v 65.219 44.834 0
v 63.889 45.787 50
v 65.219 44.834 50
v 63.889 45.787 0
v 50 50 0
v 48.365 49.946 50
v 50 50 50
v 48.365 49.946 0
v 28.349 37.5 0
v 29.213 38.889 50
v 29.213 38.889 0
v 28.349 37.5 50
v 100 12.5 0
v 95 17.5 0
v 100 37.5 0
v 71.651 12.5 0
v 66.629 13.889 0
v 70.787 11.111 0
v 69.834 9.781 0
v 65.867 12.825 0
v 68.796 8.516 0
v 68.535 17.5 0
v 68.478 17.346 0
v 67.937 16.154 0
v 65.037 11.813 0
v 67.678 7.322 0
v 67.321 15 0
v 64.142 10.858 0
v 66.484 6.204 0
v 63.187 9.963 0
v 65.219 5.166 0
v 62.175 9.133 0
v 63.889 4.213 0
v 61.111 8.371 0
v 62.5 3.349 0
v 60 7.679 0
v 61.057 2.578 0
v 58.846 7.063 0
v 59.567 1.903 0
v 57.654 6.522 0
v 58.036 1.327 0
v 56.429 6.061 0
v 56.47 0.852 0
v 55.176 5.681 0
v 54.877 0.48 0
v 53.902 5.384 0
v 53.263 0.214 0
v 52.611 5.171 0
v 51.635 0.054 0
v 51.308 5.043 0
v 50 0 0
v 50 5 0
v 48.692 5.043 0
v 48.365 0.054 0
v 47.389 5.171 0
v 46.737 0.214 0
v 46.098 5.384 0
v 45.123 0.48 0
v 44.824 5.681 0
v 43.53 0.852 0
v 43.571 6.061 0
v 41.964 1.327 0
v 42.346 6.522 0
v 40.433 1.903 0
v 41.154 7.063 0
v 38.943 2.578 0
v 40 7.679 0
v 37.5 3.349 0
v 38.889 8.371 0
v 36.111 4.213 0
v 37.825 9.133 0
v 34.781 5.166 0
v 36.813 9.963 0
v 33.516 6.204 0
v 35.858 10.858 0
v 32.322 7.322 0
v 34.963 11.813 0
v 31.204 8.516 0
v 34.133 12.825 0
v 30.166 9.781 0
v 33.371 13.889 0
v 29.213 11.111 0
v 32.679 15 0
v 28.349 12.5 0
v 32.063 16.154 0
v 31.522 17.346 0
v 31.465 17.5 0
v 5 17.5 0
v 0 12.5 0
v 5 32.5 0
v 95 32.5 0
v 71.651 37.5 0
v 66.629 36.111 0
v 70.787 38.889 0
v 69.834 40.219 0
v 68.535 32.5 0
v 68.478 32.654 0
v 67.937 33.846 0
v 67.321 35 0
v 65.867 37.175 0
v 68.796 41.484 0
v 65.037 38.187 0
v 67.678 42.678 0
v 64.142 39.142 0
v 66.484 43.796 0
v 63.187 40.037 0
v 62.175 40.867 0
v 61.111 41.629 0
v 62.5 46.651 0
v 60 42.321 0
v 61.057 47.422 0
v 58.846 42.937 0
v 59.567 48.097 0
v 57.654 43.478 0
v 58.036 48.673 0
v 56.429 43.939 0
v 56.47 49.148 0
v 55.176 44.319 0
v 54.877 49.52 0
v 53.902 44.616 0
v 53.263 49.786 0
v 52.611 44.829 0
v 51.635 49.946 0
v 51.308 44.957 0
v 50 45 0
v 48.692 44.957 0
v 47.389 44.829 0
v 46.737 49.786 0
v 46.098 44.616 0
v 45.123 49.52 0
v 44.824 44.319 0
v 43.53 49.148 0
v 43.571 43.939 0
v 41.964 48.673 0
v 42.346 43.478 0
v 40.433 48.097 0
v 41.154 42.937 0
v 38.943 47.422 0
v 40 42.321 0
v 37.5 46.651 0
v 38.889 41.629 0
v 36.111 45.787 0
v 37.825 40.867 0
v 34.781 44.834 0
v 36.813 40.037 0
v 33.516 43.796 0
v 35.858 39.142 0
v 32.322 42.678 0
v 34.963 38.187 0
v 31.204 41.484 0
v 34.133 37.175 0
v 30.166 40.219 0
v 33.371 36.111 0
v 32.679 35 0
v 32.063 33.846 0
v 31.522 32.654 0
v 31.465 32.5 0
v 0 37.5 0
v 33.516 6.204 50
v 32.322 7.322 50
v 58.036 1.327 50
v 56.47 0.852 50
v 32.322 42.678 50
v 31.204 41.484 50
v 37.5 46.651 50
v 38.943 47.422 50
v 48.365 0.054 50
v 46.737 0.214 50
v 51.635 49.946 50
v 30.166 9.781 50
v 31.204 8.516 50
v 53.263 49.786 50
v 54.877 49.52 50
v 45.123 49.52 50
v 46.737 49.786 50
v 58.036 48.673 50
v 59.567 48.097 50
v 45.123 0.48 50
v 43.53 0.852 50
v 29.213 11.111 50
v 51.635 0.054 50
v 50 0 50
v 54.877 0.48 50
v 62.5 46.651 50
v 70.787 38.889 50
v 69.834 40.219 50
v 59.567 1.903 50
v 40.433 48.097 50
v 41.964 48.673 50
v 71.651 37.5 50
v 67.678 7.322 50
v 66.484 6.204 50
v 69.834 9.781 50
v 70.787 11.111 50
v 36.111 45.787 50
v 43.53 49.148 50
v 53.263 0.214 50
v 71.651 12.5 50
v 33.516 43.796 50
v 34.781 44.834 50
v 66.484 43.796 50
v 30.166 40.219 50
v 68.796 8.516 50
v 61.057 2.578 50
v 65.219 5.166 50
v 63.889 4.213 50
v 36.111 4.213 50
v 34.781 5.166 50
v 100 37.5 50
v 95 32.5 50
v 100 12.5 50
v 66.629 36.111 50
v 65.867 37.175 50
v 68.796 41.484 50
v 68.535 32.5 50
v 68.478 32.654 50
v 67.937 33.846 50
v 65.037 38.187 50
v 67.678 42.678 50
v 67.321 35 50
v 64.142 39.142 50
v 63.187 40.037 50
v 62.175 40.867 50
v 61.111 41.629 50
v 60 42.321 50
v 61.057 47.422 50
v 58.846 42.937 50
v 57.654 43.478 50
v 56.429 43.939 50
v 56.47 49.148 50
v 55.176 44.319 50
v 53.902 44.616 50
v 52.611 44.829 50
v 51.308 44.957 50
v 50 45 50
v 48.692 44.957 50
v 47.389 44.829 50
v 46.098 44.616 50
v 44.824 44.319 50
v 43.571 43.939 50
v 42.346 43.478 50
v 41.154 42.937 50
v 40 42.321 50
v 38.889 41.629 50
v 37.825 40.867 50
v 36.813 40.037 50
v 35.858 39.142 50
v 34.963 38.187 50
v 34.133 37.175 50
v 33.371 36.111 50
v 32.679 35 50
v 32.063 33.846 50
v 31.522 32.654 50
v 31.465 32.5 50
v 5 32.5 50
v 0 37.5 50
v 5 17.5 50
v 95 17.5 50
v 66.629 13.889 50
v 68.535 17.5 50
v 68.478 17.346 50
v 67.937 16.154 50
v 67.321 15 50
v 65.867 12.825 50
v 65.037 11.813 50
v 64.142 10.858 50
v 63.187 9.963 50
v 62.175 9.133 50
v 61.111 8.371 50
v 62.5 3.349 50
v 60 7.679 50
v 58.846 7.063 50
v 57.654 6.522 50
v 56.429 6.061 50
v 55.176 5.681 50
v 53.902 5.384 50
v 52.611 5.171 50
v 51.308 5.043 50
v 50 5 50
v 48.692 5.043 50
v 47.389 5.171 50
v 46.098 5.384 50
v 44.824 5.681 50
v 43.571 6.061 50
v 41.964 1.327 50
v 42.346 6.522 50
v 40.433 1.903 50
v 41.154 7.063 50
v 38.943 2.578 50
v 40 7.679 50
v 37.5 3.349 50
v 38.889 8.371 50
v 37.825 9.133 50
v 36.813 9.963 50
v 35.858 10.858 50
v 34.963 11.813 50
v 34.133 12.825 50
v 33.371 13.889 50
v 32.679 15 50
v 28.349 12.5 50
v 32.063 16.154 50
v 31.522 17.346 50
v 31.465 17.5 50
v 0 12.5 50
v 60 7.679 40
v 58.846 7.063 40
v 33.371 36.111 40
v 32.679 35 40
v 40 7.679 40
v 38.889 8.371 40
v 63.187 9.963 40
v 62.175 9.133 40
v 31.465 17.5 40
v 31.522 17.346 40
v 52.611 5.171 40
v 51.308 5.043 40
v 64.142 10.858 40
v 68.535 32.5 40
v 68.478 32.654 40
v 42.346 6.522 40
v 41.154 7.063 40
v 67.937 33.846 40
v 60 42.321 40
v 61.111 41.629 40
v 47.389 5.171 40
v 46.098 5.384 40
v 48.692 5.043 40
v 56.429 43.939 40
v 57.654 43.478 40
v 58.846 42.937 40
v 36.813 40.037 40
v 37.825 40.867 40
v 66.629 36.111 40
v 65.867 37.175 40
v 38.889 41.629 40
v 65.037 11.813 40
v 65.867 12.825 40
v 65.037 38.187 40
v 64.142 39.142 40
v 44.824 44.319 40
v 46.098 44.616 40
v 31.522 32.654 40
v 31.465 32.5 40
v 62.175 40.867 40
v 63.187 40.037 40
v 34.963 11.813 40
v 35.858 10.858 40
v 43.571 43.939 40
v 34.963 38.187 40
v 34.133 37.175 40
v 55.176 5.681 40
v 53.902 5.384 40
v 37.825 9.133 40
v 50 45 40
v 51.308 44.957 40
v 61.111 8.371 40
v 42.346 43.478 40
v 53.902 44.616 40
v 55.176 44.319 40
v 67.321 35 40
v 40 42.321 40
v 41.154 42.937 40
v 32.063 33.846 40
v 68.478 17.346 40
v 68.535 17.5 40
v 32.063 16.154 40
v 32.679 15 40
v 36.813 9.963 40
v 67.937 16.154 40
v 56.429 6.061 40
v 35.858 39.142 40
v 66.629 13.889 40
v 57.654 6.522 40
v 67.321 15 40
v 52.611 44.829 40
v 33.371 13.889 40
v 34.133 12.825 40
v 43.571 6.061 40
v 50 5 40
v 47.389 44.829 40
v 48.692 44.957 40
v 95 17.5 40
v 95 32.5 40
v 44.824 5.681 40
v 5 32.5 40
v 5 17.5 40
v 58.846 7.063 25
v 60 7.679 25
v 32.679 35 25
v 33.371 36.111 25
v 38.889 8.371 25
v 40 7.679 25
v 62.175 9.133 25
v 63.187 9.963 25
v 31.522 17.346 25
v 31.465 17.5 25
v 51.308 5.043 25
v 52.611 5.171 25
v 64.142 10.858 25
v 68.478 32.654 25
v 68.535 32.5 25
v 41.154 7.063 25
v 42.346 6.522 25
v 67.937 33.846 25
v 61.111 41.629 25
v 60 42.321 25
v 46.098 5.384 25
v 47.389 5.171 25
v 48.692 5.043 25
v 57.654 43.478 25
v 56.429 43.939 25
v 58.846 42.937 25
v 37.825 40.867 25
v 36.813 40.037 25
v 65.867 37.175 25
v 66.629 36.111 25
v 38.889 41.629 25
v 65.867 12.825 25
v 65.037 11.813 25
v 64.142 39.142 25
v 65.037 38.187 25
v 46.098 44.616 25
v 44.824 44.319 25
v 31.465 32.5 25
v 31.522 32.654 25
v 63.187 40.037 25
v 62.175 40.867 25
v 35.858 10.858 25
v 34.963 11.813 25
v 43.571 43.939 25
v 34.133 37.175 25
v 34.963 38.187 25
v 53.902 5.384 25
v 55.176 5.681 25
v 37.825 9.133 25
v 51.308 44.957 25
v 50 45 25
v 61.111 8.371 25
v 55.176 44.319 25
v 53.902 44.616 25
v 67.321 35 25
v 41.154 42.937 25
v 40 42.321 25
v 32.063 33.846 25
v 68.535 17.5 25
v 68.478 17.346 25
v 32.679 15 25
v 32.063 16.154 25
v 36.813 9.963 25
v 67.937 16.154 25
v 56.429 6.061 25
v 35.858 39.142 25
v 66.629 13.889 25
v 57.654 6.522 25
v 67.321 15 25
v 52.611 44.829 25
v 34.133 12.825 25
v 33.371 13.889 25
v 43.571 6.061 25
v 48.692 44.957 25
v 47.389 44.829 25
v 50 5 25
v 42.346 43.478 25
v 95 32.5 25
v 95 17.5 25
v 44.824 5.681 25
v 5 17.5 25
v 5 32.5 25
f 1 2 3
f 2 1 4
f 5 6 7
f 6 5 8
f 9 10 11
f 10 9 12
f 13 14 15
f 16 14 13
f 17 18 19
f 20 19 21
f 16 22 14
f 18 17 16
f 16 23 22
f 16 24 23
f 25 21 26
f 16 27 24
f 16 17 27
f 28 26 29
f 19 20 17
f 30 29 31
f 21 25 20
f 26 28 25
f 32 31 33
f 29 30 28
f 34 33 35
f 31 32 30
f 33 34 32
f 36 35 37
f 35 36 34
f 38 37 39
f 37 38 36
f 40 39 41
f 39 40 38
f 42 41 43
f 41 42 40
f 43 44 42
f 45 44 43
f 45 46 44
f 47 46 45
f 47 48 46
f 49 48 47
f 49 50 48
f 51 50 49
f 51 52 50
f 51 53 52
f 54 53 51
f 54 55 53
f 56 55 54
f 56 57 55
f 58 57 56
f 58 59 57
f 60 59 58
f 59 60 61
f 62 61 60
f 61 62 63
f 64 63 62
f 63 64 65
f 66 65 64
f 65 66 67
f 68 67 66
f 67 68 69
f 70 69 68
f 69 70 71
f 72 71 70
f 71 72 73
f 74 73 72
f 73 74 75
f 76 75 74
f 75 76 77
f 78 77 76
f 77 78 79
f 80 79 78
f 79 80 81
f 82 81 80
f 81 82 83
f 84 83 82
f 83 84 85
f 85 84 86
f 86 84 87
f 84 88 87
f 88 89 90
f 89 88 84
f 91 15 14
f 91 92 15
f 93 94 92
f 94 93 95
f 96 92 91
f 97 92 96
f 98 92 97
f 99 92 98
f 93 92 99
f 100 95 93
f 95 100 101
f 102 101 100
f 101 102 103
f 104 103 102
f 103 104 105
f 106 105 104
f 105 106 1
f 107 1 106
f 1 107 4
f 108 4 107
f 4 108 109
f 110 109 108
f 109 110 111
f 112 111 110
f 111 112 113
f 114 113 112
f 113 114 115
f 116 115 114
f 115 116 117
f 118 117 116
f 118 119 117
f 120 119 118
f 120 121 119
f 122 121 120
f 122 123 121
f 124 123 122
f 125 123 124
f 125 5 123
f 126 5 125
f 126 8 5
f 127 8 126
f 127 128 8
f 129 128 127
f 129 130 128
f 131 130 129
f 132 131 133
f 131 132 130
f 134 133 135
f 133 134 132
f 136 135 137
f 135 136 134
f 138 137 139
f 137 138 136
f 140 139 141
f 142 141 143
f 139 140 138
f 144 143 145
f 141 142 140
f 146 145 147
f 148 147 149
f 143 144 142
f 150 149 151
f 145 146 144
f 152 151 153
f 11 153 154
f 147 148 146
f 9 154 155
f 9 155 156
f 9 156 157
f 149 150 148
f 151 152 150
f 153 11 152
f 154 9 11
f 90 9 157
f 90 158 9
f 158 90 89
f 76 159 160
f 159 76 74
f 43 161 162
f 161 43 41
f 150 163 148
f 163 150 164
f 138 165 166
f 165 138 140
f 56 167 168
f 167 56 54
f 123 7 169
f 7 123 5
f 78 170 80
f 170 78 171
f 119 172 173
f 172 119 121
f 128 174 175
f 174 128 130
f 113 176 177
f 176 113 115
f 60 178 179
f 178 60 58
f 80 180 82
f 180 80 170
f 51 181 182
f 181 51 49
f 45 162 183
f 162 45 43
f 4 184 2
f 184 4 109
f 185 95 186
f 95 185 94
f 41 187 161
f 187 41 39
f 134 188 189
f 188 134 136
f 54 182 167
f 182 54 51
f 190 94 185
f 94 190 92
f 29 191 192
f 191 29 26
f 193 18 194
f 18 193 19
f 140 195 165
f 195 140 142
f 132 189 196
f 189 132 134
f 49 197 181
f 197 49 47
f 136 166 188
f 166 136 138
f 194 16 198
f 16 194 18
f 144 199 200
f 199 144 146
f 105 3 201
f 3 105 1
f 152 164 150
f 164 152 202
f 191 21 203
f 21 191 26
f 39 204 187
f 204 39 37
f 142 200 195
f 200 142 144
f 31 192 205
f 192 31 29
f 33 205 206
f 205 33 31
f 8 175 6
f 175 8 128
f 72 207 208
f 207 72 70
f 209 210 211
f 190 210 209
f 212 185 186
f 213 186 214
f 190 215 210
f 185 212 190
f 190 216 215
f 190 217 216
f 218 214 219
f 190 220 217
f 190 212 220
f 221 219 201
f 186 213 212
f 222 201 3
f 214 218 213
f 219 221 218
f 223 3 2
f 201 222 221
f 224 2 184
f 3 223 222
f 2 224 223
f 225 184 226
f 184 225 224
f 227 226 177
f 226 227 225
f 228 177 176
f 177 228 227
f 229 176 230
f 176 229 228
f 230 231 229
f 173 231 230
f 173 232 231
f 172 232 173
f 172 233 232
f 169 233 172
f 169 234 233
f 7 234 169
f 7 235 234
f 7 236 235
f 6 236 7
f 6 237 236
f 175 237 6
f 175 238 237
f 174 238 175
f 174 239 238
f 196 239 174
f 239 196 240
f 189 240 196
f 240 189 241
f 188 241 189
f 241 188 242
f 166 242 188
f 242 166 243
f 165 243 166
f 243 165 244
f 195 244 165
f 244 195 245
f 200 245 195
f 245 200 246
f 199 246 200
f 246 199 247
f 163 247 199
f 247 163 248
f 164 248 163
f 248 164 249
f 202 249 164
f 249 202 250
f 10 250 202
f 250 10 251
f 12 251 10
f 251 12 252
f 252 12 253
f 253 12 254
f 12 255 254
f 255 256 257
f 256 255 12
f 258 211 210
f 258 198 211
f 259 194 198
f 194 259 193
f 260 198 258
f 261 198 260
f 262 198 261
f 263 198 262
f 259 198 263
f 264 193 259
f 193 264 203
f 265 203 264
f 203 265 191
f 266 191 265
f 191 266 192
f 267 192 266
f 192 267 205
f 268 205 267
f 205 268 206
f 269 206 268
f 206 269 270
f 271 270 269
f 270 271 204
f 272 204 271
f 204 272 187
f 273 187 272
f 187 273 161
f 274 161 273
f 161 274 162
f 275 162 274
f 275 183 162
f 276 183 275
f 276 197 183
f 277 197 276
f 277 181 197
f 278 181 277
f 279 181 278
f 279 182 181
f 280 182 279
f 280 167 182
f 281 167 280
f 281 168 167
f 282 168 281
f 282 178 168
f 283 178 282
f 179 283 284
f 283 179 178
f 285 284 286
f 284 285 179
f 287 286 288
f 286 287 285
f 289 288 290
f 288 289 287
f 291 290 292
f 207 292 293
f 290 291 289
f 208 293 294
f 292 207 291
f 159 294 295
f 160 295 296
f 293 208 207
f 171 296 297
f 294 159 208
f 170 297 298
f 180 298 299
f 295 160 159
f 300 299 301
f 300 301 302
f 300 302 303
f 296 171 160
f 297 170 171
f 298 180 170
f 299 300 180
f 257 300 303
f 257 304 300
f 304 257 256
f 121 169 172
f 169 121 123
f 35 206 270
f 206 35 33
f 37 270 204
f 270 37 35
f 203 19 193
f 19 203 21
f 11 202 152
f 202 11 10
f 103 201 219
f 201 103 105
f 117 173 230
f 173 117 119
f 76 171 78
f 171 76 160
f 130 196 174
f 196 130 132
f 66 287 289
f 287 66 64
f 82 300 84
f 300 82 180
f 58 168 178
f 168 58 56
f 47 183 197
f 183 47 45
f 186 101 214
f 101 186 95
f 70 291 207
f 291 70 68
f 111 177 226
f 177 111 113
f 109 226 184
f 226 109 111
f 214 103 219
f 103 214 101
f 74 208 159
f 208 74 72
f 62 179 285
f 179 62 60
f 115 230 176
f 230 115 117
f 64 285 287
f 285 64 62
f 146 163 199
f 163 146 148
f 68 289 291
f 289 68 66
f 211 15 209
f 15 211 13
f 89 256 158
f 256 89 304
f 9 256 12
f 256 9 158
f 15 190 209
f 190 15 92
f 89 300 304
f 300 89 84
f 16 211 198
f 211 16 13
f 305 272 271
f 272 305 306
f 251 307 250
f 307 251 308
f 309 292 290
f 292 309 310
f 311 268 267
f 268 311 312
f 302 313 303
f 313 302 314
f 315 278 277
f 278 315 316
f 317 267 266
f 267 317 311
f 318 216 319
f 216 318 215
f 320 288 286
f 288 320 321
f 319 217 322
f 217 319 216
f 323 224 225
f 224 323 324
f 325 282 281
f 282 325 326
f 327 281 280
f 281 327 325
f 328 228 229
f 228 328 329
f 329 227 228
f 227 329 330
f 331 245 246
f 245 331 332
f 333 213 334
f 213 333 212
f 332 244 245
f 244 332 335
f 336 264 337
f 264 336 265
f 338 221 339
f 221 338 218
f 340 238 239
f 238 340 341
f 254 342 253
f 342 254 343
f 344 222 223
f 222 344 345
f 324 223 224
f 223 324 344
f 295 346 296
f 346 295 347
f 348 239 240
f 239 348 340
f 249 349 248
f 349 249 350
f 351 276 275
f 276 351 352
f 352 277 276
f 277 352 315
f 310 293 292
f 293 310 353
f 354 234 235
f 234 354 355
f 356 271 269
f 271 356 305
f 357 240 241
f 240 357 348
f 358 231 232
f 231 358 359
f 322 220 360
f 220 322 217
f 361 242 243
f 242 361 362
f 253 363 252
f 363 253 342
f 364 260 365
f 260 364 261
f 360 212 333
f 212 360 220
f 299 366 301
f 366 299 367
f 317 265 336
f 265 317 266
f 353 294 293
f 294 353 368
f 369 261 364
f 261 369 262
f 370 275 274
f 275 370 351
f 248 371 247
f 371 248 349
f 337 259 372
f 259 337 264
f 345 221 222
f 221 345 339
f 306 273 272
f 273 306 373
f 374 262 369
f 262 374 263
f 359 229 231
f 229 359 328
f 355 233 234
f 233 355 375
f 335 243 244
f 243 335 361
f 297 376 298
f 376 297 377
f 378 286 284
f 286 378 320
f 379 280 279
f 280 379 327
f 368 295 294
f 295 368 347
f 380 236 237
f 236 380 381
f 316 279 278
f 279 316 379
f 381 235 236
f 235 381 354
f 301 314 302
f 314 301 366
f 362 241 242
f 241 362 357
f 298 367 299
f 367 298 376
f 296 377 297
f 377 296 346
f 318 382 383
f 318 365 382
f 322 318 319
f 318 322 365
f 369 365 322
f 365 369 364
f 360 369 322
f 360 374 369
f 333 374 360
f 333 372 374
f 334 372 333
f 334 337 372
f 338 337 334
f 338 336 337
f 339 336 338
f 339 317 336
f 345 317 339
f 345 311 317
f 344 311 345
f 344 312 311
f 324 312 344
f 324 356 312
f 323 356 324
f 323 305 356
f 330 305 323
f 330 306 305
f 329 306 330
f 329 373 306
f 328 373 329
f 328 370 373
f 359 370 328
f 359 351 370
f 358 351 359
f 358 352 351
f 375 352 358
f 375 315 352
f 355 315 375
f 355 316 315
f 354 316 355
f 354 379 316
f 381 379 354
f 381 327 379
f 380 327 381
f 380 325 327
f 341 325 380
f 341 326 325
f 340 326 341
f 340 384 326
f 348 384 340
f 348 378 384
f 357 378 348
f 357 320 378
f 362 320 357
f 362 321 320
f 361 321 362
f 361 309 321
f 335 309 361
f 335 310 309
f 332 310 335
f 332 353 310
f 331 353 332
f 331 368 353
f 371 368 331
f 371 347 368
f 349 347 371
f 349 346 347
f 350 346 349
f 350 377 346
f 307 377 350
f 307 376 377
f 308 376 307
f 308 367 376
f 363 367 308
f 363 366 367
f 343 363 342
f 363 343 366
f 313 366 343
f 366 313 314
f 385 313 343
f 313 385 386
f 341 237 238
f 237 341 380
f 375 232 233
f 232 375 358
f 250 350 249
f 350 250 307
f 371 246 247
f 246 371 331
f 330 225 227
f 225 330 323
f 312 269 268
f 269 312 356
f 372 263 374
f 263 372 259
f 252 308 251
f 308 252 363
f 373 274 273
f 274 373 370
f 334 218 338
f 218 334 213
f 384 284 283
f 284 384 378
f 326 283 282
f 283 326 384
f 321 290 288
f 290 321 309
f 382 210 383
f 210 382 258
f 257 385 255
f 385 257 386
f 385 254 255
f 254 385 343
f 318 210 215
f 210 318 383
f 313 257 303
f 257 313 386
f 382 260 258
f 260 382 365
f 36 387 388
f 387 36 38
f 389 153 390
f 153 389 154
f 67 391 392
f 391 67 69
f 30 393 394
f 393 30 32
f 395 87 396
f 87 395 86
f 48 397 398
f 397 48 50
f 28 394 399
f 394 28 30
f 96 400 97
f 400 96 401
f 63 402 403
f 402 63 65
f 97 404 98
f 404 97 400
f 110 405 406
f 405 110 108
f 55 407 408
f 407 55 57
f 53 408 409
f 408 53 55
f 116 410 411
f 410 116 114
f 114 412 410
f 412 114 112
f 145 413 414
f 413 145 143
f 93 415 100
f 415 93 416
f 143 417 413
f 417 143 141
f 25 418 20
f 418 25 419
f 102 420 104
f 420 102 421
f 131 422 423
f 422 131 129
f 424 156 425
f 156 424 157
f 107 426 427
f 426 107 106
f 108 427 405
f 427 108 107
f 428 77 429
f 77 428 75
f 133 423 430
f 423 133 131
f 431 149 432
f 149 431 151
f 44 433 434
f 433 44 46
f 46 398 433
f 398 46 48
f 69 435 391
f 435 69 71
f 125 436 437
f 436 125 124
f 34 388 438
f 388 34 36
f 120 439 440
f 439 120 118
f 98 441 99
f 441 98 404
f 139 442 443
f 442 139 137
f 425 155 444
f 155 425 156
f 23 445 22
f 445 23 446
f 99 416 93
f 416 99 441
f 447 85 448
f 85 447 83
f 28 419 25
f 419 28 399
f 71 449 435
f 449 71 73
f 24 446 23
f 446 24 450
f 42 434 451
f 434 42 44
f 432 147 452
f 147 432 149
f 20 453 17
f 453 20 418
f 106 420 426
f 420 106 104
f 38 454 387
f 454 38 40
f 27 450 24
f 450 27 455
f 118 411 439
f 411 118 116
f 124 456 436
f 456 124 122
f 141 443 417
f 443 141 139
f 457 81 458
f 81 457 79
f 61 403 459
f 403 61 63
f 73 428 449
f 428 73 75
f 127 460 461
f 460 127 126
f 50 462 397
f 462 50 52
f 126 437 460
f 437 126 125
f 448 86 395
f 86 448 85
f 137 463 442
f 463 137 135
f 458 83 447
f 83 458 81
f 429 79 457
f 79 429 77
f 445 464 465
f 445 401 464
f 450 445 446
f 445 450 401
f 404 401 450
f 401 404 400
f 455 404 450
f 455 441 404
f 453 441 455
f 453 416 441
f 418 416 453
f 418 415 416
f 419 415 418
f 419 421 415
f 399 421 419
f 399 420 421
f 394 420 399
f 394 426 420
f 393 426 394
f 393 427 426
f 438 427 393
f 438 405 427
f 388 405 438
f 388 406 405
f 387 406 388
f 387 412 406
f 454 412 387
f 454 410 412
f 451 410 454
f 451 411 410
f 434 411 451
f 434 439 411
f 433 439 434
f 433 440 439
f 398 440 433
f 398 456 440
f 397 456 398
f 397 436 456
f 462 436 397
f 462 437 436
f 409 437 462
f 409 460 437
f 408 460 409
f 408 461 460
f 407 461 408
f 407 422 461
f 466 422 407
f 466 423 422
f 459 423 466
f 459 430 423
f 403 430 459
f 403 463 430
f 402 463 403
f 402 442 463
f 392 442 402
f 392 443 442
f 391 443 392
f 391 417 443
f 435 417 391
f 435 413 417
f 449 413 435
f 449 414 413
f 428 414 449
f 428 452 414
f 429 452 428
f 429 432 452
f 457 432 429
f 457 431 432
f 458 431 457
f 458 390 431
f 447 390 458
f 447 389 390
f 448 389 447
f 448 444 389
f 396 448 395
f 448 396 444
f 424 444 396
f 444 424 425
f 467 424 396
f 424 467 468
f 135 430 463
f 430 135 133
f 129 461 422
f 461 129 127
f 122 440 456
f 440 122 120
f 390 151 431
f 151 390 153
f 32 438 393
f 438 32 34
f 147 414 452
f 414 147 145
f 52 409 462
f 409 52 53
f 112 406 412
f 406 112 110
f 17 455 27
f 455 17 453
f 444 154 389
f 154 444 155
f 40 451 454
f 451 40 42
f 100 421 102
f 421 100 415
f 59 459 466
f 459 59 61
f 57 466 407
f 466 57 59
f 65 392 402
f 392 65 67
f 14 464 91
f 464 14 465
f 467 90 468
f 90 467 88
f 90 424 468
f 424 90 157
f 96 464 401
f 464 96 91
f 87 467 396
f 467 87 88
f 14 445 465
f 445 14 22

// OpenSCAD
// test with union and difference
// 16.05.2026 Sebastian Weigl

// set the fregment sizes
$fn = 96;
difference() {
// main body
  union() {
    translate([50,25,0])
    cylinder(h=50,r=25,center=false);
    translate([0,12.5,0])
    cube([100,25,50]);
  }
// difference from top down
  union() {
    translate([50,25,40])
    cylinder(h=10,r=20,center=false);
    translate([5,17.5,40])
    cube([90,15,10]);
  }
// difference from bottom up
  union() {
  translate([50,25,0])
  cylinder(h=25,r=20,center=false);
  translate([5,17.5,0])
  cube([90,15,25]);
  }
}
